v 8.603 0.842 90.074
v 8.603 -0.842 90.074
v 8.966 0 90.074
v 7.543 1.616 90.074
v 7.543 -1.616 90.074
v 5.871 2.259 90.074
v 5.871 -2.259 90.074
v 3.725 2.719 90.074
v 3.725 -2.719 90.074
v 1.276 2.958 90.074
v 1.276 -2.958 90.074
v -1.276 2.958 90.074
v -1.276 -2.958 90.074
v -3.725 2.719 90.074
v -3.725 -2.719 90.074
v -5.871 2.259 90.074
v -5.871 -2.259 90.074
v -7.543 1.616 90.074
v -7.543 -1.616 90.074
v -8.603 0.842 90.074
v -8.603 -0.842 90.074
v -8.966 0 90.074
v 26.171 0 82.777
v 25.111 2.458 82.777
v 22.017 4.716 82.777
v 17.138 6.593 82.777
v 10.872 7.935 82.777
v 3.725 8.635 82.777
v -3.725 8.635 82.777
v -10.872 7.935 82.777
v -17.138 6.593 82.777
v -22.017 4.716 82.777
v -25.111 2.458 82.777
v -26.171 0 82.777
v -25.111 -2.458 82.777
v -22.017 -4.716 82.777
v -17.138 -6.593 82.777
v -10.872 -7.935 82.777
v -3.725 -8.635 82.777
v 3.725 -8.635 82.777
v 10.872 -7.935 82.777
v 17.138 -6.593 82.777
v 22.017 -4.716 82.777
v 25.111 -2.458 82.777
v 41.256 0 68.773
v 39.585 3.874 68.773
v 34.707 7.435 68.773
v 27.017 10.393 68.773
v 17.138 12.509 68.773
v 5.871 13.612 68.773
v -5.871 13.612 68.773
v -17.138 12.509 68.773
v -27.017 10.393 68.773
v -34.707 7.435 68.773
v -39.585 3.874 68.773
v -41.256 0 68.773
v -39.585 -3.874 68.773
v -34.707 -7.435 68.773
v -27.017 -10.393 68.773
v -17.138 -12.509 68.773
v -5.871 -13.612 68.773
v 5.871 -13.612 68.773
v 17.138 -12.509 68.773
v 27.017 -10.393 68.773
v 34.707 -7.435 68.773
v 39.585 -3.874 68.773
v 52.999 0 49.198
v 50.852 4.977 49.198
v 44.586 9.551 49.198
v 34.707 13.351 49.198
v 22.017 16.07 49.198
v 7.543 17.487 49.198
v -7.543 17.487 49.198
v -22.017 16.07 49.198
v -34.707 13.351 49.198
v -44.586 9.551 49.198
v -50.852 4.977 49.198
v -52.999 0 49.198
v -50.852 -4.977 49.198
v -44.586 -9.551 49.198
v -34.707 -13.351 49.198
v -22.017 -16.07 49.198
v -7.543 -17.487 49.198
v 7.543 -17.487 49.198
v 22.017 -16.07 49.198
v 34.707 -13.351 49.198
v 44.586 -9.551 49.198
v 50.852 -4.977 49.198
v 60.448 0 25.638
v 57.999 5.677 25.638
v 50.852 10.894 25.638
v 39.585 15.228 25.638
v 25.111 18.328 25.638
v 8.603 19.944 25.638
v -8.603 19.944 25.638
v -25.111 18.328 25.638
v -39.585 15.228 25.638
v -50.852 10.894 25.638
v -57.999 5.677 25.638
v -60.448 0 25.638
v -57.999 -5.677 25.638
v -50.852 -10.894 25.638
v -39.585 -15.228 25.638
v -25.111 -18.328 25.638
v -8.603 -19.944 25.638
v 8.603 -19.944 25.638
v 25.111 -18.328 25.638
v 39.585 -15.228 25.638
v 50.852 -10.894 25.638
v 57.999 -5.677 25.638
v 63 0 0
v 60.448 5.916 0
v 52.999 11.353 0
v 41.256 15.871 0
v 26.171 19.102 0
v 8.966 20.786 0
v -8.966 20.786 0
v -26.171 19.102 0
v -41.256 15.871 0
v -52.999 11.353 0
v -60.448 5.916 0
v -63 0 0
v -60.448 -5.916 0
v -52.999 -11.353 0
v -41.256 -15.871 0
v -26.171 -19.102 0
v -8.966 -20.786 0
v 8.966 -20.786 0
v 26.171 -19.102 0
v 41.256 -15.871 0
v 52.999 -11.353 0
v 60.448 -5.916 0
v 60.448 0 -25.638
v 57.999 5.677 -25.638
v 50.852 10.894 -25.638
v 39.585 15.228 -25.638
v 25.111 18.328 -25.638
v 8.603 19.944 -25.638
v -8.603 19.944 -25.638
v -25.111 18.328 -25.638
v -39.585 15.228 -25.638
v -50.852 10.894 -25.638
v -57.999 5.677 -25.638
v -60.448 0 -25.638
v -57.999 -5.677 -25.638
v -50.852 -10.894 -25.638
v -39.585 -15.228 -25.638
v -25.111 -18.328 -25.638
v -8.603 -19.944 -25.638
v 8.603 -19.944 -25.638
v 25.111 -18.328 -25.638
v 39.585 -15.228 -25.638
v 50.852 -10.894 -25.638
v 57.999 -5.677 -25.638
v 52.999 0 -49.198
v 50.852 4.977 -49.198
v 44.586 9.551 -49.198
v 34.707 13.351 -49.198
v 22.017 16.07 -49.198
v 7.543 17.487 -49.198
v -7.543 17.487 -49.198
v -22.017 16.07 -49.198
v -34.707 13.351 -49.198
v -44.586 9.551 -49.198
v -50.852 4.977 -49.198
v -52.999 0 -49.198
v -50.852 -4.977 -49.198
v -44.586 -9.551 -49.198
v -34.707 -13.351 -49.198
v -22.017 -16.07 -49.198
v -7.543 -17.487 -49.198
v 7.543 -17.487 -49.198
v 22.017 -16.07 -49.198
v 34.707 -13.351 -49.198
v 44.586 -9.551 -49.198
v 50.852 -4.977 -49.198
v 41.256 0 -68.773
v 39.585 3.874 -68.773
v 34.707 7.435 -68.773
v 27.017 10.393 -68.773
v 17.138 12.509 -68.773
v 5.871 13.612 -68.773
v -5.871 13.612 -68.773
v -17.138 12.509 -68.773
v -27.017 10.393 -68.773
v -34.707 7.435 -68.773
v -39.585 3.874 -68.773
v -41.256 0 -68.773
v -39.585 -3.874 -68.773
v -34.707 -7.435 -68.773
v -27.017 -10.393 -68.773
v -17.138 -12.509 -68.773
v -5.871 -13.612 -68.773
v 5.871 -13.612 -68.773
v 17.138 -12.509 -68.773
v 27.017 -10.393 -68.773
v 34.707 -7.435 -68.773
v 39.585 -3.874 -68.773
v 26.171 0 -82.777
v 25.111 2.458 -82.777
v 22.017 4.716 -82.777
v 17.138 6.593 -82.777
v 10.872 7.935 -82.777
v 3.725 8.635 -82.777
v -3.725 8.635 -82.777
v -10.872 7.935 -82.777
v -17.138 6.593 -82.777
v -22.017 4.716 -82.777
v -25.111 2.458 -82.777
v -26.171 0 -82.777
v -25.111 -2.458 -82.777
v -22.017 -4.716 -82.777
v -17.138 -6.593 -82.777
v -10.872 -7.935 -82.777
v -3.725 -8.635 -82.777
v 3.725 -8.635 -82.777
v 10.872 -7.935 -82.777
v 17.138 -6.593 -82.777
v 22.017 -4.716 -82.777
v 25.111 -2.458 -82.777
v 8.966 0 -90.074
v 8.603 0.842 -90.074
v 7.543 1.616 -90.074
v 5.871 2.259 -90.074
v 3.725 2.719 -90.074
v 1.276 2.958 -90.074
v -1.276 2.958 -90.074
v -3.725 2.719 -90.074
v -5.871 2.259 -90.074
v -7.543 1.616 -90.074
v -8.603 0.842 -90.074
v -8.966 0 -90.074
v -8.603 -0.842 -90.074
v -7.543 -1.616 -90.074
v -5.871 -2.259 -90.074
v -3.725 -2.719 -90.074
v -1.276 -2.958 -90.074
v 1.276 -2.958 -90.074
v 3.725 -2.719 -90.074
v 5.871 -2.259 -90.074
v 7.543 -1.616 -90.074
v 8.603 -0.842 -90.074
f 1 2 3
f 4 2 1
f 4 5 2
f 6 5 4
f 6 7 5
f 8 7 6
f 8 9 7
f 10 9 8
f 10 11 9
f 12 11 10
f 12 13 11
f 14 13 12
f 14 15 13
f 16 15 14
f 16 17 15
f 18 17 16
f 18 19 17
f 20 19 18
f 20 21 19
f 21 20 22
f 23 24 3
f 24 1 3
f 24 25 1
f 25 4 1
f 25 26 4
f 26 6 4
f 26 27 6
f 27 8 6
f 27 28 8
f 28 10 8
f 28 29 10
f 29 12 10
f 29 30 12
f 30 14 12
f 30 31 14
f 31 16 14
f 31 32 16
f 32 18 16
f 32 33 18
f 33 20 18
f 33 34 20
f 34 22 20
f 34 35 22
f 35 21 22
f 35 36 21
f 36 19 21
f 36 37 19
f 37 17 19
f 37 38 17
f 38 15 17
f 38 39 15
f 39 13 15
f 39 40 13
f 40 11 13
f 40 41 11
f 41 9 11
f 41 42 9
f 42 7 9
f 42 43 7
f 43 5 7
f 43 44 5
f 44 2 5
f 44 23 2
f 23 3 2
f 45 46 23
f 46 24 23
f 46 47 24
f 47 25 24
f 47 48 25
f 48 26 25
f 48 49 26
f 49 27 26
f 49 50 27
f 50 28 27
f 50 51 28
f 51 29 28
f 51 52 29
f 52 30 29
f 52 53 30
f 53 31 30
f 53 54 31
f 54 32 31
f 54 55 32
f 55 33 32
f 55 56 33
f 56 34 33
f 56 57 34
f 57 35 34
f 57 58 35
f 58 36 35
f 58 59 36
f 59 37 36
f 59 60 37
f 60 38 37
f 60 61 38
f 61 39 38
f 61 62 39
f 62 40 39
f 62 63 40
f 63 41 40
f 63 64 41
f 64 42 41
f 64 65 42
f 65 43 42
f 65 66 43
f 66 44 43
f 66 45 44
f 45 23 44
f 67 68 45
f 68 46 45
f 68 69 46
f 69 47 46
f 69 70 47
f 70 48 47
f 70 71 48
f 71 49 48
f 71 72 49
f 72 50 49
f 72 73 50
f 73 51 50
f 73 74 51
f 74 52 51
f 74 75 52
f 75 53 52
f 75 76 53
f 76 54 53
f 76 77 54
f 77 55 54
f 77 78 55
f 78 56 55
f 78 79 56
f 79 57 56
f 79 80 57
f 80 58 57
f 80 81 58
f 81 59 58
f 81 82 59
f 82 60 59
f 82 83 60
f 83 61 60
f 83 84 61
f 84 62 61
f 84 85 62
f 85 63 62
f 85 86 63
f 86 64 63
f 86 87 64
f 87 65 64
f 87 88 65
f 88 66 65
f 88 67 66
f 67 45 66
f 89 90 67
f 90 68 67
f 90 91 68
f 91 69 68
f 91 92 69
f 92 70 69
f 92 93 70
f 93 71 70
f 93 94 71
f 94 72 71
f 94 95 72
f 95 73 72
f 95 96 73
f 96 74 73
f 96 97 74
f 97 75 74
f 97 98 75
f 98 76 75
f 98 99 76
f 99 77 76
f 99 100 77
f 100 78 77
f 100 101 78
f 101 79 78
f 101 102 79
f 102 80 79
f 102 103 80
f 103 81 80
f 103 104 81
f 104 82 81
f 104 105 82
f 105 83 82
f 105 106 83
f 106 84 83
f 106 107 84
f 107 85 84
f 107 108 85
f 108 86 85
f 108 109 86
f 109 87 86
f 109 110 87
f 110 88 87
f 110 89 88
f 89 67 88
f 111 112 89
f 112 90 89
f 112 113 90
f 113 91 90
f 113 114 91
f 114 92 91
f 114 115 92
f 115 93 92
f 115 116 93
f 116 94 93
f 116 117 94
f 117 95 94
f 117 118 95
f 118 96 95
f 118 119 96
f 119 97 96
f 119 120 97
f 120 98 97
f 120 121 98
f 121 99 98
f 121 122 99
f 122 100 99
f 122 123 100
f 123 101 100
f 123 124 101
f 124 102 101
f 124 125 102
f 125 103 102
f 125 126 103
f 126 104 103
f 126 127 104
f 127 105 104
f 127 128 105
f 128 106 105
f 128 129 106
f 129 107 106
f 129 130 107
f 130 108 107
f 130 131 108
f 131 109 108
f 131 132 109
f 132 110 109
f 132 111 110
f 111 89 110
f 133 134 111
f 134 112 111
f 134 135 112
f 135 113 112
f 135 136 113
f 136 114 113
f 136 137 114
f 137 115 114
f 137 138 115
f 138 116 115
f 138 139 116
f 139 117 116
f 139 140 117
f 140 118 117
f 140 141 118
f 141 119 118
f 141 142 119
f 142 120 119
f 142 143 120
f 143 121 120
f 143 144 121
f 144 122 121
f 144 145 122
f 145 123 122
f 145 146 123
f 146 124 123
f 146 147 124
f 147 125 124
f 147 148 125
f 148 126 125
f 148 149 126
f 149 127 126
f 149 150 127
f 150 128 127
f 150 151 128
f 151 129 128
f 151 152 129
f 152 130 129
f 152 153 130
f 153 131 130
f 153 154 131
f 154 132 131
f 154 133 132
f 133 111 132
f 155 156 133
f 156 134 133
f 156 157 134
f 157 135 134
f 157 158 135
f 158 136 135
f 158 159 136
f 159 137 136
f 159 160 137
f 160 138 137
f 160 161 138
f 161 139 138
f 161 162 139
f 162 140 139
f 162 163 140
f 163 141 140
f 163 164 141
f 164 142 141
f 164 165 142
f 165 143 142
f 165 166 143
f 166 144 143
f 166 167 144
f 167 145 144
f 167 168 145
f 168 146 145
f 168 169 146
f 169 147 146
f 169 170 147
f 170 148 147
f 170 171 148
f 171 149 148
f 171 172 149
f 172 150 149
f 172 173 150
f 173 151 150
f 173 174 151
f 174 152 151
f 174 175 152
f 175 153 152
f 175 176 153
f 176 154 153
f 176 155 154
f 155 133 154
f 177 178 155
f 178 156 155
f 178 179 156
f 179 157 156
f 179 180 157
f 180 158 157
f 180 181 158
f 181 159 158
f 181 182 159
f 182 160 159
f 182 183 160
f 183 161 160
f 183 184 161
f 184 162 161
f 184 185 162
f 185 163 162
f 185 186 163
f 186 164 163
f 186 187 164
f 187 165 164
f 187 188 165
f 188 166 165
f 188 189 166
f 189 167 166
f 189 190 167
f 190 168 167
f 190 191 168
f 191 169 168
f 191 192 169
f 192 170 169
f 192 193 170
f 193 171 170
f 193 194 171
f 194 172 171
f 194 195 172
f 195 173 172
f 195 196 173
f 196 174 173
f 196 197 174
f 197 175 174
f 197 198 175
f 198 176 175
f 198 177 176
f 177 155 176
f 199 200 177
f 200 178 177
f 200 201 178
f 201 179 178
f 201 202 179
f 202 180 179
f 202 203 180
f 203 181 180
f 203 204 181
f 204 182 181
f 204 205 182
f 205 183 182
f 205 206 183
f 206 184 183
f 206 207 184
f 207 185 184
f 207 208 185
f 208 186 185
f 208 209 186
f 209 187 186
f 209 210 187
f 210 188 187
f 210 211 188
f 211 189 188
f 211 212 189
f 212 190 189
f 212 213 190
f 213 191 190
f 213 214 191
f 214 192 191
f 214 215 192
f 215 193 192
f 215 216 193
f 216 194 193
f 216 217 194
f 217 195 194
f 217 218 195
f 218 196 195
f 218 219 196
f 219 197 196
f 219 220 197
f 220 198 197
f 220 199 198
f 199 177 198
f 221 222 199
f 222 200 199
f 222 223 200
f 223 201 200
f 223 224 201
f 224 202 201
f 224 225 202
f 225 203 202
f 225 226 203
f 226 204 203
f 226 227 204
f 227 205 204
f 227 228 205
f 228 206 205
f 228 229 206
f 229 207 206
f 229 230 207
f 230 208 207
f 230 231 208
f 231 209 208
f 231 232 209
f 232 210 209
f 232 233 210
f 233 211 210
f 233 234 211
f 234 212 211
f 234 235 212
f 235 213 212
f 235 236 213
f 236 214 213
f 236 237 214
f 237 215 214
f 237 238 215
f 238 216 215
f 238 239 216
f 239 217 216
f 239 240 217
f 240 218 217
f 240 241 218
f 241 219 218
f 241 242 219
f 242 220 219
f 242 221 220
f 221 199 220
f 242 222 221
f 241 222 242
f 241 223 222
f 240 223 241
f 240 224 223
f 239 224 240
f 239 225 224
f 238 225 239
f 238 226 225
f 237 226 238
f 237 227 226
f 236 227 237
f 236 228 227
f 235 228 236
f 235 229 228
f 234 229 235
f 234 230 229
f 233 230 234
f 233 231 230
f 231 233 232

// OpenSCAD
// Generated by SolidPython 1.0.1 on 2020-07-29 00:46:48


scale(v = [9, 3, 13]) {
	sphere(r = 7);
}
/***********************************************
*********      SolidPython code:      **********
************************************************
 
# import packages: SolidPython
from solid import *
from solid.utils import *
from itertools import chain, combinations, permutations


class Resize:

    def __init__(self, scad_file):
        self.scad_file = scad_file
        #self.scad_file = import_scad(scad_file)
        # cone/cylinder param:
        self.r1 = 0
        self.r2 = 0
        self.h = 0
        # rectangular prism param:
        self.w = 0
        self.l = 0
        # ellipse param:
        self.r = 0

    # import OpenScad code (file name corresponds to shape)


    # classify shape + parameters
    def assign(self, param1, param2, param3):
        if self.scad_file == 'cone.scad':
            self.r1 = param1
            self.r2 = param2
            self.h = param3
        elif self.scad_file == 'cylinder.scad':
            self.r1 = param1
            self.r2 = param2
            self.h = param3
        elif self.scad_file == 'rectangularPrism.scad':
            self.h = param1
            self.l = param2
            self.w = param3
        else:
            self.r = param1
            self.h = param2

    # resize parameters
    def iterate(self):
        x = range(3, 20, 2)
        i = 1
        if self.scad_file == 'cone.scad':
            tempList = list(permutations(x, 2))
            for temp in tempList:
                param1 = temp[0]
                param2 = temp[1]
                filepath = 'produced_scad_files/' + 'cone' + str(param1) + '_' + str(param2) + '_' + '.scad'
                scad_render_to_file(cylinder(h=param1, r1=param2, r2=0), filepath)

        elif self.scad_file == 'cylinder.scad':
            tempList = list(permutations(x, 3))
            for temp in tempList:
                param1 = temp[0]
                param2 = temp[1]
                filepath = 'produced_scad_files/' + 'cylinder' + str(param1) + '_' + str(param2) + '_' + '.scad'
                scad_render_to_file(cylinder(h=param1, r1=param2, r2=param2), filepath)

        elif self.scad_file == 'rectangularPrism.scad':
            tempList = list(permutations(x, 3))
            for temp in tempList:
                param1 = temp[0]
                param2 = temp[1]
                param3 = temp[2]
                filepath = 'produced_scad_files/' + 'rectangularPrism' + str(param1) + '_' + str(param2) + '_' + str(
                    param3) + '.scad'
                scad_render_to_file(cube(size=(param1, param2, param3)), filepath)

        elif self.scad_file == 'ellipse.scad':
            tempList = list(permutations(x, 4))
            for temp in tempList:
                param1 = temp[0]
                param2 = temp[1]
                param3 = temp[2]
                param4 = temp[3]
                filepath = 'produced_scad_files/' + 'ellipse' + str(param1) + '_' + str(param2) + '_' + str(param3) + '_' + str(param4) + '.scad'
                scad_render_to_file(scale([param1, param2, param3])(sphere(r=param4)), filepath)

    def render_to_scadfile(self):
        scad_render_to_file(scad, 'example.scad') 
 
************************************************/
